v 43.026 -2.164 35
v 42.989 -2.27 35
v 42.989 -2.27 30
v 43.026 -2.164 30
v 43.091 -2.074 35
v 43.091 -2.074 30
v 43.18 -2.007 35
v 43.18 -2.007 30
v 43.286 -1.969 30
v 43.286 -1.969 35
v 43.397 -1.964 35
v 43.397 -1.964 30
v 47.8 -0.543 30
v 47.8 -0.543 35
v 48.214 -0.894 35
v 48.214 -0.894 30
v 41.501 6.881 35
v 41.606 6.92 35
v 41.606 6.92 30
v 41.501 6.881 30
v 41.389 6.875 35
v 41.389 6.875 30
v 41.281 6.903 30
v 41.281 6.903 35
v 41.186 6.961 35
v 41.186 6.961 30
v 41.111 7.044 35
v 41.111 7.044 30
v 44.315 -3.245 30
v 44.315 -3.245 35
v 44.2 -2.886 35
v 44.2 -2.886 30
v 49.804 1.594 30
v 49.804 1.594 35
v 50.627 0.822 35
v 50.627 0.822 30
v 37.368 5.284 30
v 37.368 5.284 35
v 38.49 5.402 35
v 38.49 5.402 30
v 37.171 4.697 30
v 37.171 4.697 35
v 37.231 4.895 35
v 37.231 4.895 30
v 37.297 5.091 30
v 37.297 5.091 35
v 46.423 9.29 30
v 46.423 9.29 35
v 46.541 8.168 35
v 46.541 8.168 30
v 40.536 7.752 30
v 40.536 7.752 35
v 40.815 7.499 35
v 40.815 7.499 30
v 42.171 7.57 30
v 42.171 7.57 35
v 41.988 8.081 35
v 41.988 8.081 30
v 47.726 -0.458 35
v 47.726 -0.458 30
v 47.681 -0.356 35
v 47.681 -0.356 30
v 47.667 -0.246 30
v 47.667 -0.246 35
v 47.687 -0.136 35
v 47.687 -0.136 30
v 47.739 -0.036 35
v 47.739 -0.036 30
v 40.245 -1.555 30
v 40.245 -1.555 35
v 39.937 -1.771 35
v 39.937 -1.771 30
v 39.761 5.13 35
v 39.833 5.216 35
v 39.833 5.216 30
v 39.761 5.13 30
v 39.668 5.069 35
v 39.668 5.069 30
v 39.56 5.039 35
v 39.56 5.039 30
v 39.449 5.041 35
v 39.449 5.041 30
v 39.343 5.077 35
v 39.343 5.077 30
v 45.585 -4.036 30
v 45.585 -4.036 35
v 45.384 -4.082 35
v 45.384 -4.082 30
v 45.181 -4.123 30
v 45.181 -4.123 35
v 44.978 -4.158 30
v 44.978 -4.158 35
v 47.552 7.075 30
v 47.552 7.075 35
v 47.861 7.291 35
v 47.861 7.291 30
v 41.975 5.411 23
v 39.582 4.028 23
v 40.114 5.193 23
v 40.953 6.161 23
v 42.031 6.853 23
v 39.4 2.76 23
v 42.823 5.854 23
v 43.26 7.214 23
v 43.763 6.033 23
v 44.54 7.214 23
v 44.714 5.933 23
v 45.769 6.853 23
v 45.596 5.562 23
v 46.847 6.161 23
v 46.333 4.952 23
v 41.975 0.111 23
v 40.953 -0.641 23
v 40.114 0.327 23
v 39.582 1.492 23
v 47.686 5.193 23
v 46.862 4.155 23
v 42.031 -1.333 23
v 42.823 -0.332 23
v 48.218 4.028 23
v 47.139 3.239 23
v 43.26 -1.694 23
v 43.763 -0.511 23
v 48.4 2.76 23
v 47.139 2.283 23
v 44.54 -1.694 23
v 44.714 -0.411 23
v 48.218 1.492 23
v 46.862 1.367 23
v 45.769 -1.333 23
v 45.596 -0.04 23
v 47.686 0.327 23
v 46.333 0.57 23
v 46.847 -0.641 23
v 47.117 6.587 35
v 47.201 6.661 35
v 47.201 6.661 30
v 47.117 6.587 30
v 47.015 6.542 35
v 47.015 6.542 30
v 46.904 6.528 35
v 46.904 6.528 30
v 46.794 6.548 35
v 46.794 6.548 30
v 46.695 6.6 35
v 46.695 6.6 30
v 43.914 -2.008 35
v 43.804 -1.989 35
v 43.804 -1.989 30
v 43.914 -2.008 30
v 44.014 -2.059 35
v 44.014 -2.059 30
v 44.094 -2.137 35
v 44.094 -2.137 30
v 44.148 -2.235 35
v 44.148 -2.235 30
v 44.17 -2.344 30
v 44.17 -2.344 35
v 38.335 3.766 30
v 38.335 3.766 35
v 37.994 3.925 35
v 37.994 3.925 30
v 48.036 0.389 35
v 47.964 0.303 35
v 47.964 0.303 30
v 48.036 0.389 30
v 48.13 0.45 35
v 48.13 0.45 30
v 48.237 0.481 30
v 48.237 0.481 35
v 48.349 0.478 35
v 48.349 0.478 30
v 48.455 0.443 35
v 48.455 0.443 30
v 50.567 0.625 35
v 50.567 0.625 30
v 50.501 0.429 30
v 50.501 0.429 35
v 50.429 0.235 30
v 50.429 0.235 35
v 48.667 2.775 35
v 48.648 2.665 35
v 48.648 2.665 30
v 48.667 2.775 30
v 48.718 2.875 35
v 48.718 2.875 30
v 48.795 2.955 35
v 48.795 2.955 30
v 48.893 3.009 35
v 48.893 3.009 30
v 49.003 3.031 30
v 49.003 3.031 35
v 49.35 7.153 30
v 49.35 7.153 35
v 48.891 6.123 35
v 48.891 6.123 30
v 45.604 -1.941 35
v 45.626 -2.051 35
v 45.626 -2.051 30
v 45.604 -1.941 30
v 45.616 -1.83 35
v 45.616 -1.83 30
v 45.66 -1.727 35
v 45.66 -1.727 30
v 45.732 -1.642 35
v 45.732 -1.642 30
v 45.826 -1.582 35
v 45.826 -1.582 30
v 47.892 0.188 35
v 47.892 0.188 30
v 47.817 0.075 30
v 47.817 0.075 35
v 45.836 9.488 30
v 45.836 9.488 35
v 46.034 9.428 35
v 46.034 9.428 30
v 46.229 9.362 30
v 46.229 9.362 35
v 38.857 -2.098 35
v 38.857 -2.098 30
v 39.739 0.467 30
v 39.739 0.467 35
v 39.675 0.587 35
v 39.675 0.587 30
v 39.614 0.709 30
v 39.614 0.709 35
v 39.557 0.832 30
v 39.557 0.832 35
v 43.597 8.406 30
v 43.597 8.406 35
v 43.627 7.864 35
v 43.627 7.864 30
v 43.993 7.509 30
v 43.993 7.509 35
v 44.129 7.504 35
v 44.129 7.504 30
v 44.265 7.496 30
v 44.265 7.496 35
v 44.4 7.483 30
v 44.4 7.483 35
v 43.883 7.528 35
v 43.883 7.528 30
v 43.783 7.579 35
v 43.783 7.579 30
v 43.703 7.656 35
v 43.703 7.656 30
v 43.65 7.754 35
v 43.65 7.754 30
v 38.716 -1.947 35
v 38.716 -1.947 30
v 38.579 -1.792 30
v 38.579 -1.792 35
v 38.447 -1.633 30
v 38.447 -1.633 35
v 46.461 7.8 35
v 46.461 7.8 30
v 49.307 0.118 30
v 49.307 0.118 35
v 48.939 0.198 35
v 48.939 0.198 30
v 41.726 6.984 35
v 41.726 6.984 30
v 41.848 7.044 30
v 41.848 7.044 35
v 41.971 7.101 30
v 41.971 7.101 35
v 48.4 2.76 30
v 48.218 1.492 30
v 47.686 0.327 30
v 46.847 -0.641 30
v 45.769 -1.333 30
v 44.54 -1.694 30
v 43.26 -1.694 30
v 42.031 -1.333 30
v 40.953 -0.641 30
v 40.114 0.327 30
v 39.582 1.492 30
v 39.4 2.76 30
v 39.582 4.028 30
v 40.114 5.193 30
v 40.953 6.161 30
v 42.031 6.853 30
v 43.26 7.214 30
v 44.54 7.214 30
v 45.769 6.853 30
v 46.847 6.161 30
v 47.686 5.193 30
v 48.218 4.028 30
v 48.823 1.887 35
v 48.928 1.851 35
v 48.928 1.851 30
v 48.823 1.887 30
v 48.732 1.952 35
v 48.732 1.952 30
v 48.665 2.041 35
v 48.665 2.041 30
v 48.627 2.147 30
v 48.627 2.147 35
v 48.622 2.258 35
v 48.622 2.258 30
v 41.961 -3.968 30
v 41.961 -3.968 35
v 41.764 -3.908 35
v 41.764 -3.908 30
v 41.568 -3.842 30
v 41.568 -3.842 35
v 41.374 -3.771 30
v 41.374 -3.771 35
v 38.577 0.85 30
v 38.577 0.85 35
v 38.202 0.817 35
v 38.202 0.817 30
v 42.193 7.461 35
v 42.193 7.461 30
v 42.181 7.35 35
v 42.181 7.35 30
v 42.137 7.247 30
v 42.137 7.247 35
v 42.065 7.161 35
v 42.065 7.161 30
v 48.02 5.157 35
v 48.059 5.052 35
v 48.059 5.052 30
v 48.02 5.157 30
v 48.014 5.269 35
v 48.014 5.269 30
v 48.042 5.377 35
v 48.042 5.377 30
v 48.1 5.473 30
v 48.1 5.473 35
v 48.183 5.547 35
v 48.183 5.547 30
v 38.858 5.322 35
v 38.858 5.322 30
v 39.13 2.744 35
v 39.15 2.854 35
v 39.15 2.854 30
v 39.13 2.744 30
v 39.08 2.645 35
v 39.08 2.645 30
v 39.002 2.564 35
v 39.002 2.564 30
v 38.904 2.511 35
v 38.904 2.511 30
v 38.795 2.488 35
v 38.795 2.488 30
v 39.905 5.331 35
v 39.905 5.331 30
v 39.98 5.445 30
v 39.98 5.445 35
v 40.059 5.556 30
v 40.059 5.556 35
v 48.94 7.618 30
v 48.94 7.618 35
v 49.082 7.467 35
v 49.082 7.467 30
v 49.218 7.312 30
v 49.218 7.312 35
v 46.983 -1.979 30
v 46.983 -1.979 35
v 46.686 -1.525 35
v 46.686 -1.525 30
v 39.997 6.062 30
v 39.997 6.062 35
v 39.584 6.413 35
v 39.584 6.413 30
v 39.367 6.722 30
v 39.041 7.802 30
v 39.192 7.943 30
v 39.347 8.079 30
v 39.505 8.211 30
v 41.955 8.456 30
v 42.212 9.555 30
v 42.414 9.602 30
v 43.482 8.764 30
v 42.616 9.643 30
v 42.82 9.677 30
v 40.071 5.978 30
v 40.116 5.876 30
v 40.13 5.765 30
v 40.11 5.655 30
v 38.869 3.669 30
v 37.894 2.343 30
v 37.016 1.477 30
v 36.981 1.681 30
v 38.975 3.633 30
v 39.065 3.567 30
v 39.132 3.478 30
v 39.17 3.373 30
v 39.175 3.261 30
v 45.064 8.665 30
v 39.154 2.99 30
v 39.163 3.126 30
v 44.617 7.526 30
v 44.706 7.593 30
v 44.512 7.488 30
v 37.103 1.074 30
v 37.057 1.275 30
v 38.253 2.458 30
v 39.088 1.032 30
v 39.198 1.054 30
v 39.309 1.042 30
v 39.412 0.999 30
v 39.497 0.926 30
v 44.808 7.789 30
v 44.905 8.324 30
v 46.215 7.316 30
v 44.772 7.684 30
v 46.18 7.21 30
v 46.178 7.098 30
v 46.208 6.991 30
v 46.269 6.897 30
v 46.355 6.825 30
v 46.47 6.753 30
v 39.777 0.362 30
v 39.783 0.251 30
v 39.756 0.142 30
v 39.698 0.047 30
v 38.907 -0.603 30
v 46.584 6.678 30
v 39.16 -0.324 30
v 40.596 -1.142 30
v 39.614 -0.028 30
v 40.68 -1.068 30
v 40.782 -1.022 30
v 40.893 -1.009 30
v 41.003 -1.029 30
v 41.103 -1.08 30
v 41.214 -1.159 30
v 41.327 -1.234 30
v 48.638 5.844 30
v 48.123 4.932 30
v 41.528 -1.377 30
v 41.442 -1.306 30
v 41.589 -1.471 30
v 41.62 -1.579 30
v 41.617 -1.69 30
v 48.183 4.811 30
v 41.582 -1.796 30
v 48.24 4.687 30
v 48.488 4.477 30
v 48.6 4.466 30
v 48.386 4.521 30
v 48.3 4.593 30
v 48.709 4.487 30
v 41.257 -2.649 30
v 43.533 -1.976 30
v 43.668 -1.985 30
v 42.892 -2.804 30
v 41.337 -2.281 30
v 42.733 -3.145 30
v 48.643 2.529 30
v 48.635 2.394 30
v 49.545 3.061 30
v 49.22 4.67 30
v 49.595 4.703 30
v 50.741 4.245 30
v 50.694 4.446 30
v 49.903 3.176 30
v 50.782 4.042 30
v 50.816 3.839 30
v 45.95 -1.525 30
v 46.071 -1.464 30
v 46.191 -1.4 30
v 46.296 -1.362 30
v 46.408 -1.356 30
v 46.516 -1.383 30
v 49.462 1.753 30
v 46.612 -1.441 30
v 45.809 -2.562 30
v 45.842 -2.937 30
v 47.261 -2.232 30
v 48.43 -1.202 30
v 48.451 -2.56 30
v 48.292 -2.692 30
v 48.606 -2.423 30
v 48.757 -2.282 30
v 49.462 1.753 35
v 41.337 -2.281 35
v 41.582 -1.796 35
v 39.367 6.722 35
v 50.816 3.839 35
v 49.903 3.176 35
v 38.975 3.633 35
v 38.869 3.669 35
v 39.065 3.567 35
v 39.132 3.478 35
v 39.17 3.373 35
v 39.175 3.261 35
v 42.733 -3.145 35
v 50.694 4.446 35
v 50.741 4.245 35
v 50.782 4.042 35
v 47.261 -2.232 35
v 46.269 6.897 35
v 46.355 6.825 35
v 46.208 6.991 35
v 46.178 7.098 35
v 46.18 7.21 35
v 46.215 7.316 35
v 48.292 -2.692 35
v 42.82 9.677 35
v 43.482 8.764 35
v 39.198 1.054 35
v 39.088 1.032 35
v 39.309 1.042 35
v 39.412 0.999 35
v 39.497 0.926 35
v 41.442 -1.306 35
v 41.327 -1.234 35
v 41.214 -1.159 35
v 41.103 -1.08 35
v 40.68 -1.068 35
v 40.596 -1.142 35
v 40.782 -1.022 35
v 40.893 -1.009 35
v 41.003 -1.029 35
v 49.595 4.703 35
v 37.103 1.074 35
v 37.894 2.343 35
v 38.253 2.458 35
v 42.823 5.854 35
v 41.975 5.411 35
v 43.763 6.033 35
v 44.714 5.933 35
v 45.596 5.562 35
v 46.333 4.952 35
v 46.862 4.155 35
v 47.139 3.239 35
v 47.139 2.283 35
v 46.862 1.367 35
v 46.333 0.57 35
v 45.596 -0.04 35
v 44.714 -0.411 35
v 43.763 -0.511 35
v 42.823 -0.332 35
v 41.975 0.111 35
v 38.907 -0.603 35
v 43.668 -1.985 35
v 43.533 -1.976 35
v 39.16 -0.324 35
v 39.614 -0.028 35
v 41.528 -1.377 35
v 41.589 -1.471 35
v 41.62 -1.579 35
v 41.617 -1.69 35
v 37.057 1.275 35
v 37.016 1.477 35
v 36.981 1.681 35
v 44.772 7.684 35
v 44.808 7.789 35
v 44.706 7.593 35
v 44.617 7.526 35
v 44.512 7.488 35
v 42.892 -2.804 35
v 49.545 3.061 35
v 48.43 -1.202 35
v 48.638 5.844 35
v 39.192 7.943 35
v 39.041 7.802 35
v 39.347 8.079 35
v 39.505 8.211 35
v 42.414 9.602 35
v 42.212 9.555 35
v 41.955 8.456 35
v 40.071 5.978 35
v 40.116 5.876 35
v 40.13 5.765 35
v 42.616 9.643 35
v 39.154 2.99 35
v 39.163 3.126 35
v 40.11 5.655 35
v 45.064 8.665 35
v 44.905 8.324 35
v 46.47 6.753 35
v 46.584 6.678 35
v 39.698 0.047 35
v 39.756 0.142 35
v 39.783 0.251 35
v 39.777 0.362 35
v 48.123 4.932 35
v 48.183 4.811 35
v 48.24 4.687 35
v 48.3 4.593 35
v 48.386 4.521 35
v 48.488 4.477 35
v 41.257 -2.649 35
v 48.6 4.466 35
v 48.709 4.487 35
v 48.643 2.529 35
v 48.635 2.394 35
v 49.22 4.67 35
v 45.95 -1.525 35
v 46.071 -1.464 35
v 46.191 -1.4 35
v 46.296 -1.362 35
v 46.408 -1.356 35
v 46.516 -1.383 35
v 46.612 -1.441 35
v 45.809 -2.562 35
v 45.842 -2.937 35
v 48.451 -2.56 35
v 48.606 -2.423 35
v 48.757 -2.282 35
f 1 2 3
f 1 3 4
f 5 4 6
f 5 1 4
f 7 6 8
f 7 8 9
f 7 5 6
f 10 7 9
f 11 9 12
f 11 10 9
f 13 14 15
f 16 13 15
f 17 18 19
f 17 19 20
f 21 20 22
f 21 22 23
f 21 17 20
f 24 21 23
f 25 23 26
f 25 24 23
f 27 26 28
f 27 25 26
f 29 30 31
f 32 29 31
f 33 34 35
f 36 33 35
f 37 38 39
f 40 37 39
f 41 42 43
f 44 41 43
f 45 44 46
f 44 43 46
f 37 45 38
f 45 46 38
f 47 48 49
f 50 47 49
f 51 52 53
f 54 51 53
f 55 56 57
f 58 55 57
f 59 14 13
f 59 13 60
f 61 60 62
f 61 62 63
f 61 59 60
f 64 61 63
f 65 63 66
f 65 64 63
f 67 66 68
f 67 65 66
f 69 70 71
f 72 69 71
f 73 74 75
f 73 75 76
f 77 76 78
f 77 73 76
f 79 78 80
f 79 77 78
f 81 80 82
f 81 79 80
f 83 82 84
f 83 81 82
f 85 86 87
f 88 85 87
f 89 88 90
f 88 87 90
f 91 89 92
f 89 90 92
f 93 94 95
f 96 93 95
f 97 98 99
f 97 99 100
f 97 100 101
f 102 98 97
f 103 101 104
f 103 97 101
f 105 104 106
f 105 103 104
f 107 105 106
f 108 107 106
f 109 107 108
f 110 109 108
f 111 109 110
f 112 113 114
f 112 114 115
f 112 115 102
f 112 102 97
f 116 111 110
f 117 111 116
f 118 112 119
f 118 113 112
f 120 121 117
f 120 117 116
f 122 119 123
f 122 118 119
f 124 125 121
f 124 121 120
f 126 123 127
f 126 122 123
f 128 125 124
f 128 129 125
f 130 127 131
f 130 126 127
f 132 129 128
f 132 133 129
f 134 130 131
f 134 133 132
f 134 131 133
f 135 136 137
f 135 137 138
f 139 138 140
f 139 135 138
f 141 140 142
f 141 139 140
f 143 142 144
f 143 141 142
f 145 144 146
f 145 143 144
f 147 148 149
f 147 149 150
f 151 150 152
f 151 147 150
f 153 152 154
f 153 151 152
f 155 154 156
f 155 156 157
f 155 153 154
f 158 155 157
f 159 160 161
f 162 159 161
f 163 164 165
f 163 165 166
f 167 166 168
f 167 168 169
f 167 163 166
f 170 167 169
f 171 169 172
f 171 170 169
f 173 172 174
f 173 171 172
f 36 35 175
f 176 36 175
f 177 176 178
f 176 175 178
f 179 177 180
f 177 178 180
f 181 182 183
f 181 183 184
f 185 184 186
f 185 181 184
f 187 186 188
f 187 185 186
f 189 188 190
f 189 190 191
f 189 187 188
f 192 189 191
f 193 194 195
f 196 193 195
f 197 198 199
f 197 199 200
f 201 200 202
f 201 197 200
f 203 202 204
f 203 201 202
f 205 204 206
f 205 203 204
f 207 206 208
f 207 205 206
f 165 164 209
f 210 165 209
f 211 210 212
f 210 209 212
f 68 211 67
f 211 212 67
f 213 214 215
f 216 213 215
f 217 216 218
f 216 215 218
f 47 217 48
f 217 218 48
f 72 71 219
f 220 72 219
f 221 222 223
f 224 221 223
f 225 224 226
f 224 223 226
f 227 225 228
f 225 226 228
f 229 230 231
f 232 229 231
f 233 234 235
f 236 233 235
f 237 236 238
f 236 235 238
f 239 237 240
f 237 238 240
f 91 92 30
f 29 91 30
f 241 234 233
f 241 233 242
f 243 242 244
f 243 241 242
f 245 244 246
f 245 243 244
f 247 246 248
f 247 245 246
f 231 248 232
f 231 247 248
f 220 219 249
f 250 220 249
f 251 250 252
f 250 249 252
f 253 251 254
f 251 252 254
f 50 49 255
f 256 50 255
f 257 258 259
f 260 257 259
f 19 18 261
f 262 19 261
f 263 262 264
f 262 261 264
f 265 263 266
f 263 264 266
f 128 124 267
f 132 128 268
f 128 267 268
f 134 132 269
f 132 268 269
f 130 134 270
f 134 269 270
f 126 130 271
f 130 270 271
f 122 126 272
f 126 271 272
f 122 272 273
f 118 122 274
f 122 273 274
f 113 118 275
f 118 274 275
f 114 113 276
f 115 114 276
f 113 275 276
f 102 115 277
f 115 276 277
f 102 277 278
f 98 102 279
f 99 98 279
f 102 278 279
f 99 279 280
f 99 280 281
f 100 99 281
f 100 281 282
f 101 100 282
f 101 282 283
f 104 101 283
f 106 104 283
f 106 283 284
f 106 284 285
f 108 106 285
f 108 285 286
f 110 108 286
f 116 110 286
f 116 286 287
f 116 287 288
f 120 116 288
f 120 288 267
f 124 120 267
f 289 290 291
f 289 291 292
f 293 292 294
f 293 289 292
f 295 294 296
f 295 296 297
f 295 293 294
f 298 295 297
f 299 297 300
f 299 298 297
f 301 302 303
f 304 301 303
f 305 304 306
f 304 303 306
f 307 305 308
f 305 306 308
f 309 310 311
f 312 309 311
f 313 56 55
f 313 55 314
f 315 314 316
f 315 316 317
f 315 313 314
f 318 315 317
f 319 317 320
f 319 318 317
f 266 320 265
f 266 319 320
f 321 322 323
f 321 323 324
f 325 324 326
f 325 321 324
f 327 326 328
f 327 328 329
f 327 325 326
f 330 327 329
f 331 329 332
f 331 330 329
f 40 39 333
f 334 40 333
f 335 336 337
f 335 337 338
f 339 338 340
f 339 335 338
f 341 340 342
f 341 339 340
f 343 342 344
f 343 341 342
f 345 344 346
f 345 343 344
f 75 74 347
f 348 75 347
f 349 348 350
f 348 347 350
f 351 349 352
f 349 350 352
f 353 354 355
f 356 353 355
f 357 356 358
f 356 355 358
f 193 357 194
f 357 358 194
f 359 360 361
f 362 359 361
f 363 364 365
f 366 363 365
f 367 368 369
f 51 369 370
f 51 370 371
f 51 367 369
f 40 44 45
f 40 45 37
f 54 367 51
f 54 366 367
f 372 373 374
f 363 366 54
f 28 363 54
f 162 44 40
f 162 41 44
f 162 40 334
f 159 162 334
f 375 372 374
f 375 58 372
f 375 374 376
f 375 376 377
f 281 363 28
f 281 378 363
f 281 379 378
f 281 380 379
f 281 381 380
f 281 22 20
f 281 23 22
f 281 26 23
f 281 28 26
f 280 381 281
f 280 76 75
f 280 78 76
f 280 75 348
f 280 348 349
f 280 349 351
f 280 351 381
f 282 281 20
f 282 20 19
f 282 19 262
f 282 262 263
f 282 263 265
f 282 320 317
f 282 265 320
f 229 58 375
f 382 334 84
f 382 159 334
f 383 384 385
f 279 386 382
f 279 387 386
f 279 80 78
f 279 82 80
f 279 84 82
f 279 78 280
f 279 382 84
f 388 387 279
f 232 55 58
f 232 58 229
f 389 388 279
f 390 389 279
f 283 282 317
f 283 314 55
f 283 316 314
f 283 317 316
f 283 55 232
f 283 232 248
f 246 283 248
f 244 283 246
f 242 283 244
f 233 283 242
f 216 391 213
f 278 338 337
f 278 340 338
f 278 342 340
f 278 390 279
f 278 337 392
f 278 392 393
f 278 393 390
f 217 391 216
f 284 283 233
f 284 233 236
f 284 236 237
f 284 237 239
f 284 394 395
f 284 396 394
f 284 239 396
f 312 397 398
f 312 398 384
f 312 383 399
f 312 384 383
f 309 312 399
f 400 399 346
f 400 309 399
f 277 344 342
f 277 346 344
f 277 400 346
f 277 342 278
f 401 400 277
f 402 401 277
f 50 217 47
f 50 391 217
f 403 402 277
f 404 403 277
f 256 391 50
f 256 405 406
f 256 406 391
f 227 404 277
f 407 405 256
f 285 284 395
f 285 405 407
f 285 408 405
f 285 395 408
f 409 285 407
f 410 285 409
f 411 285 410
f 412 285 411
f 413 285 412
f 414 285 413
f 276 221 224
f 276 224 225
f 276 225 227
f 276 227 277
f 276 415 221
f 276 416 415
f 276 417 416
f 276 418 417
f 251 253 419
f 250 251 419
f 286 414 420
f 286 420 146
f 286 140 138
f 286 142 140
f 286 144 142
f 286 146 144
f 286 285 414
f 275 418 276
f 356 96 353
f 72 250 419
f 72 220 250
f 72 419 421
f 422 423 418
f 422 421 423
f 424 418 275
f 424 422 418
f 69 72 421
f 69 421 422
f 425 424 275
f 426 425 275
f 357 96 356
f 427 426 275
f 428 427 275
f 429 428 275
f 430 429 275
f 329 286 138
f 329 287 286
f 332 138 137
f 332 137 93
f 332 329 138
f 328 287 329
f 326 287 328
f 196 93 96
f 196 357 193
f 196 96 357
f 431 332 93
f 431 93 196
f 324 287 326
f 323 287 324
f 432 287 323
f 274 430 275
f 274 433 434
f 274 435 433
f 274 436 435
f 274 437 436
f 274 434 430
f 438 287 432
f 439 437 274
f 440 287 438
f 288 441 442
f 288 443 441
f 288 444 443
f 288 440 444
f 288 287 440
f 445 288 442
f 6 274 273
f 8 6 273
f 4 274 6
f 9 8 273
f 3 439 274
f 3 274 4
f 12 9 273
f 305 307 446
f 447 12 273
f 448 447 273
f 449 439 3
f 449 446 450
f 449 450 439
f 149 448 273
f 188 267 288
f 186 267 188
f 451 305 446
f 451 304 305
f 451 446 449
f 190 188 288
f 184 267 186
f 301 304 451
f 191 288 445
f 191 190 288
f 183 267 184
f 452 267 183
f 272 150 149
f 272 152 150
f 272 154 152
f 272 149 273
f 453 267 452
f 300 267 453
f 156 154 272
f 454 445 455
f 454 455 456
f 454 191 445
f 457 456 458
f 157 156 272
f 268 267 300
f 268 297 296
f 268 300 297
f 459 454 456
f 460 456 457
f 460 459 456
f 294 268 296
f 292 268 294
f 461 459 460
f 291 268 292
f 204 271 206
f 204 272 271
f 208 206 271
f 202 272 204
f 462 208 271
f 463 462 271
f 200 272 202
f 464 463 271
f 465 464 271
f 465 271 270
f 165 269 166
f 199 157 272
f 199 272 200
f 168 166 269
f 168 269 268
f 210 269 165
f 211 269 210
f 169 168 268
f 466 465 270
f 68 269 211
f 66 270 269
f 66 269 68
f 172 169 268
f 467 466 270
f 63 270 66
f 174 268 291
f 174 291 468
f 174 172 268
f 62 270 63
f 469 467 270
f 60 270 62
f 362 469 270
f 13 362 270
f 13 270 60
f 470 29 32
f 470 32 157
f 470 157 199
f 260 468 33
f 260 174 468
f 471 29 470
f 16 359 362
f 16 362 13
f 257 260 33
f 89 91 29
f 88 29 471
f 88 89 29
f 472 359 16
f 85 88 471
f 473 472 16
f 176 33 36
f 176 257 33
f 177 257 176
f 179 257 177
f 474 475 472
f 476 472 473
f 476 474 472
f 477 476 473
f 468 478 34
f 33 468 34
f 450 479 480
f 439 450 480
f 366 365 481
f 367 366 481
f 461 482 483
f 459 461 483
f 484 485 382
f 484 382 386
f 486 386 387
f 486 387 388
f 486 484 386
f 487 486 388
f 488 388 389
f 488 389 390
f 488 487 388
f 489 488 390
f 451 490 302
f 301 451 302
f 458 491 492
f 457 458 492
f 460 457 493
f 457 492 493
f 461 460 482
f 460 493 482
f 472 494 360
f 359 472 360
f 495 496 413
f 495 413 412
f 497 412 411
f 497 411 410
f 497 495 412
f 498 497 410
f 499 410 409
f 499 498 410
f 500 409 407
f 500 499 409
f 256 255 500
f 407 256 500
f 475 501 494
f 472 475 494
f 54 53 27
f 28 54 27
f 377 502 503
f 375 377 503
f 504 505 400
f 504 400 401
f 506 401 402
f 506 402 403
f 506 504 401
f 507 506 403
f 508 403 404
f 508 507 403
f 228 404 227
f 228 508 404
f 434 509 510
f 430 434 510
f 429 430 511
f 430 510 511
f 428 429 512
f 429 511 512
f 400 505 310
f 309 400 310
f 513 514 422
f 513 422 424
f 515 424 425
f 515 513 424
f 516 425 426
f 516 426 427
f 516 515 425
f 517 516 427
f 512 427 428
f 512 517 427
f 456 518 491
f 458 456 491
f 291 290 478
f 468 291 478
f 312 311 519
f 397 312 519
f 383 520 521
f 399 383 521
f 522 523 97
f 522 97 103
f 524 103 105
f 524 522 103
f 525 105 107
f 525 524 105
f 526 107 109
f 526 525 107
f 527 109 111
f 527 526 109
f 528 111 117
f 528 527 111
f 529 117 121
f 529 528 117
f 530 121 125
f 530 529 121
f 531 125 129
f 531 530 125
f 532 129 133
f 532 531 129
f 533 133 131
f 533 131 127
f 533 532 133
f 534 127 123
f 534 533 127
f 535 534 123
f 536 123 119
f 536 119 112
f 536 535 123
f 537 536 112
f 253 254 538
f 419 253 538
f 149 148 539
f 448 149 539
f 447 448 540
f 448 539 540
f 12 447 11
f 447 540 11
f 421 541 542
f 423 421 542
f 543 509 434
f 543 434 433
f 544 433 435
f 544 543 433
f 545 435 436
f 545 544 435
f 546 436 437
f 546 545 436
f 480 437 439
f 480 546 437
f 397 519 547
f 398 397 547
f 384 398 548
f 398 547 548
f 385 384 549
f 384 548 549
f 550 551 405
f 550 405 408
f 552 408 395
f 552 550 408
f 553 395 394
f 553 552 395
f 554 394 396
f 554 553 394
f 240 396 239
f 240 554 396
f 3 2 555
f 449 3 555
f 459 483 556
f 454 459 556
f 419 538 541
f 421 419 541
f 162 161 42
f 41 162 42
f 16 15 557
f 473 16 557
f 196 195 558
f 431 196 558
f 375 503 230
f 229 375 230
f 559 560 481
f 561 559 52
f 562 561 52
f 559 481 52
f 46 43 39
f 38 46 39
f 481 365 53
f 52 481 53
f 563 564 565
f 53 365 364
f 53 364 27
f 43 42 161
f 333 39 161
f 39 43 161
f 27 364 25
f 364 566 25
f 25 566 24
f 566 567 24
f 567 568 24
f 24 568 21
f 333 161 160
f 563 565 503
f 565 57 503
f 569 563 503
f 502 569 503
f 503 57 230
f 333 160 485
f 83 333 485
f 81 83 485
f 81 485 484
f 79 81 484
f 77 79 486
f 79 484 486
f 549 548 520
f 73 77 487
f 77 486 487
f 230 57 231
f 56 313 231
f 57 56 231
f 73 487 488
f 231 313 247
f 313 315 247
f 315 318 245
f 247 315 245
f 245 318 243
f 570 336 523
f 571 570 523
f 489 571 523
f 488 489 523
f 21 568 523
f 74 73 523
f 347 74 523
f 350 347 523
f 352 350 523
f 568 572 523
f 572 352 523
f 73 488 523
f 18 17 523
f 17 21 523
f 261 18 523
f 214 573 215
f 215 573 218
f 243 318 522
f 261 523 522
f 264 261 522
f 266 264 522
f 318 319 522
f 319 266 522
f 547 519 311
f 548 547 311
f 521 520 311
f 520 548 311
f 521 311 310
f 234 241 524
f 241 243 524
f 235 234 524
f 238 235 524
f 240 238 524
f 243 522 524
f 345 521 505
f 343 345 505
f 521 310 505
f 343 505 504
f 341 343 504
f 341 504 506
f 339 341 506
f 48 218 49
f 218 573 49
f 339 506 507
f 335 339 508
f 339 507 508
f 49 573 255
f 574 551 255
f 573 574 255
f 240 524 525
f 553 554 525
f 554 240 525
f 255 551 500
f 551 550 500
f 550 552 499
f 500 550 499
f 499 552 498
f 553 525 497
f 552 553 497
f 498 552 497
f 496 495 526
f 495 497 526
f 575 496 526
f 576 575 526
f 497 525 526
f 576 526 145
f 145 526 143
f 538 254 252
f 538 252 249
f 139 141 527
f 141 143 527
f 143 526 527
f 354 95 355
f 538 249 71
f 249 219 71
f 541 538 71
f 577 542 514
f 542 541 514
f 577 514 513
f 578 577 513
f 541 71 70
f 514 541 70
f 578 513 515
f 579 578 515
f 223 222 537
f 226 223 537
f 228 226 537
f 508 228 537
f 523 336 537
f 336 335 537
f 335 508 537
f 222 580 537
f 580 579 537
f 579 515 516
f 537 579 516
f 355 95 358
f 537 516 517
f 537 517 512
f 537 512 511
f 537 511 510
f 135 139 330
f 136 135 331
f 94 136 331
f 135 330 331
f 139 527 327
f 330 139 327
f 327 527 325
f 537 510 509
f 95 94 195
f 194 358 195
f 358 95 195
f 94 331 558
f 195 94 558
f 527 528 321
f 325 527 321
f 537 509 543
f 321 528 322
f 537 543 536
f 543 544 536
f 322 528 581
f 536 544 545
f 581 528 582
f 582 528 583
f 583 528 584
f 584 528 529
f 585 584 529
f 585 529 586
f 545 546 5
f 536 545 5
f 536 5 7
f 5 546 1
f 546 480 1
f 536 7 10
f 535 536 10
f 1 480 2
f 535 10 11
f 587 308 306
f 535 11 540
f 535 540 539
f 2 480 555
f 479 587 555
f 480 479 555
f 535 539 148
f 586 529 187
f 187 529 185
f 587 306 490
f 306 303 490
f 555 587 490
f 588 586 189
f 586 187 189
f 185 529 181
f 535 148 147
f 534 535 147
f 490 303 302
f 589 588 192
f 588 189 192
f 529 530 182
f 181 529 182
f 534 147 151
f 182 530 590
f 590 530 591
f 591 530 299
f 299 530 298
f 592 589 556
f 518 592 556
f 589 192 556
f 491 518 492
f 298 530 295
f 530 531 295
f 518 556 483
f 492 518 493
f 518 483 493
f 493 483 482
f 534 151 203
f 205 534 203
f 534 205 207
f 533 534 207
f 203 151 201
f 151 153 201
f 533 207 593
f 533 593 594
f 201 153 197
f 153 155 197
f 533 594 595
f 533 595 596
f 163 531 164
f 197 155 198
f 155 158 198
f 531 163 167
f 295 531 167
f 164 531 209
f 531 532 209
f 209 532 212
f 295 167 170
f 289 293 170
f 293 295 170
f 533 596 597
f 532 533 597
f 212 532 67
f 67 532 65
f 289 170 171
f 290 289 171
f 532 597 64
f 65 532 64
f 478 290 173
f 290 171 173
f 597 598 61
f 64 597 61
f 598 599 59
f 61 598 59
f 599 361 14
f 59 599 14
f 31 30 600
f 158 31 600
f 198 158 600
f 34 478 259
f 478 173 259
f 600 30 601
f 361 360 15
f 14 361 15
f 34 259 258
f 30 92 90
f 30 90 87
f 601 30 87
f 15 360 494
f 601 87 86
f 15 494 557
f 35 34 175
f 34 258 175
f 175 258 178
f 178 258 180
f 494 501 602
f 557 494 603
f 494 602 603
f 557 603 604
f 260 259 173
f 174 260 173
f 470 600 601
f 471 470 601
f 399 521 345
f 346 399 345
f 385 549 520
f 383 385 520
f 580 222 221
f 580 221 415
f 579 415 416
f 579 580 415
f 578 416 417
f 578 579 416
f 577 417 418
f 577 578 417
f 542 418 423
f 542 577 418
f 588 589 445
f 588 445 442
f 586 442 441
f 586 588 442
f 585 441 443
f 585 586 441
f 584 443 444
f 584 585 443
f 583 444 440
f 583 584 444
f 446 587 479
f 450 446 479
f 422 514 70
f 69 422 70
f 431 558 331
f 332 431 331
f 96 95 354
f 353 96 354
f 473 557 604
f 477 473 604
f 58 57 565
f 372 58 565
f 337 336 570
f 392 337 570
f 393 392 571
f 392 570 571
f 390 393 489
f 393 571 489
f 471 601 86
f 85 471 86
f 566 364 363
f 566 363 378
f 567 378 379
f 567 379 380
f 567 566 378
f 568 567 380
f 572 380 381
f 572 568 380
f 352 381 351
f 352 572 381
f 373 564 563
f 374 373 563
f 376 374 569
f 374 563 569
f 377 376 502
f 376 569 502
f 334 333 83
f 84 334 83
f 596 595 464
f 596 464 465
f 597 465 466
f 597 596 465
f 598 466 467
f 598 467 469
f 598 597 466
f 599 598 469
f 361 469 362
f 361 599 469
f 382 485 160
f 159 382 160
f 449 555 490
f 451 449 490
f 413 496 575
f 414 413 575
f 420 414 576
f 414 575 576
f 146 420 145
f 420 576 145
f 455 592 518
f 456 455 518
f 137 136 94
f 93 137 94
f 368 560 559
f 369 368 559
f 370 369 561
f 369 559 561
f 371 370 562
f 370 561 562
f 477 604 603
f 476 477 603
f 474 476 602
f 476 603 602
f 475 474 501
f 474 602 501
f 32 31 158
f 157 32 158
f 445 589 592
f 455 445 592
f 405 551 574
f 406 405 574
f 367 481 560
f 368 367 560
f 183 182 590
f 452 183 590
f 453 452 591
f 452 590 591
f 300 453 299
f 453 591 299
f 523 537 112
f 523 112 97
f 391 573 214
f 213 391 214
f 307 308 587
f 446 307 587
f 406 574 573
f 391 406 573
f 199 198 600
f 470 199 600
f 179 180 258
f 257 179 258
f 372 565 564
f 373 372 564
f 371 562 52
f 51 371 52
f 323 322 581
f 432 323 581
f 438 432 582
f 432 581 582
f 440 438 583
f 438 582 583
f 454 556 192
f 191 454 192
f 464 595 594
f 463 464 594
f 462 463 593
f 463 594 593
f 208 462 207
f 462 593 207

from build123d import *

# Parameters (mm, degrees)
PAD018_DEPTH           = 12
CYLINDER023_R          = 4.5
CYLINDER023_DEPTH      = 12
PAD019_DEPTH           = 5
CUT017_PLACEMENT_ANGLE = 180


with BuildPart() as body016:
    # Sketch153 → Pad018 (new body)
    with BuildSketch(Plane.XY):
        with BuildLine():
            ThreePointArc((-1.924981, -2.651228), (3.274094, -0.001028), (-1.924981, 2.649172))
            Line((-1.924981, 2.649172), (-1.924981, -2.651228))
        make_face()
    extrude(amount=PAD018_DEPTH)


with BuildPart() as cylinder023:
    # Cylinder023 → Cylinder023 (new body)
    with BuildSketch(Plane.XY):
        Circle(CYLINDER023_R)
    extrude(amount=CYLINDER023_DEPTH)


with BuildPart() as pinion001:
    # Sketch154 → Pad019 (new body)
    with BuildSketch(Plane.XY):
        with BuildLine():
            Line((5.562447, 1.006802), (5.903793, 1.165811))
            Line((5.903793, 1.165811), (6.726635, 1.937659))
            ThreePointArc((6.726635, 1.937659), (6.634334, 2.233423), (6.529036, 2.524814))
            Line((6.529036, 2.524814), (5.406959, 2.642124))
            Line((5.406959, 2.642124), (5.03893, 2.562402))
            Line((5.03893, 2.562402), (4.554688, 2.317075))
            ThreePointArc((4.06426, 2.456563), (4.282119, 2.290644), (4.554688, 2.317075))
            ThreePointArc((4.06426, 2.456563), (3.955033, 2.628881), (3.838507, 2.796349))
            ThreePointArc((3.899966, 3.30251), (3.769976, 3.061482), (3.838507, 2.796349))
            Line((3.899966, 3.30251), (4.313775, 3.653848))
            Line((4.313775, 3.653848), (4.529885, 3.962227))
            Line((4.529885, 3.962227), (4.856563, 5.042087))
            ThreePointArc((4.856563, 5.042087), (4.628746, 5.252076), (4.39186, 5.451779))
            Line((4.39186, 5.451779), (3.361458, 4.992334))
            Line((3.361458, 4.992334), (3.082596, 4.739278))
            Line((3.082596, 4.739278), (2.785893, 4.284698))
            ThreePointArc((2.291426, 4.160284), (2.563058, 4.125524), (2.785893, 4.284698))
            ThreePointArc((2.291426, 4.160284), (2.110674, 4.254902), (1.926025, 4.34167))
            ThreePointArc((1.72617, 4.810749), (1.734109, 4.537017), (1.926025, 4.34167))
            Line((1.72617, 4.810749), (1.90887, 5.321921))
            Line((1.90887, 5.321921), (1.941838, 5.697039))
            Line((1.941838, 5.697039), (1.684819, 6.795565))
            ThreePointArc((1.684819, 6.795565), (1.382529, 6.863512), (1.077528, 6.918017))
            Line((1.077528, 6.918017), (0.414896, 6.004925))
            Line((0.414896, 6.004925), (0.299923, 5.646341))
            Line((0.299923, 5.646341), (0.270261, 5.104312))
            ThreePointArc((-0.095753, 4.749333), (0.156867, 4.855045), (0.270261, 5.104312))
            ThreePointArc((-0.095753, 4.749333), (-0.299598, 4.740898), (-0.502893, 4.723717))
            ThreePointArc((-0.910512, 5.030024), (-0.76677, 4.796935), (-0.502893, 4.723717))
            Line((-0.910512, 5.030024), (-1.007875, 5.564062))
            Line((-1.007875, 5.564062), (-1.166883, 5.905408))
            Line((-1.166883, 5.905408), (-1.938731, 6.72825))
            ThreePointArc((-1.938731, 6.72825), (-2.234496, 6.635949), (-2.525886, 6.53065))
            Line((-2.525886, 6.53065), (-2.643196, 5.408573))
            Line((-2.643196, 5.408573), (-2.563474, 5.040545))
            Line((-2.563474, 5.040545), (-2.318147, 4.556302))
            ThreePointArc((-2.457636, 4.065874), (-2.291717, 4.283734), (-2.318147, 4.556302))
            ThreePointArc((-2.457636, 4.065874), (-2.629953, 3.956647), (-2.797421, 3.840121))
            ThreePointArc((-3.303583, 3.90158), (-3.062555, 3.77159), (-2.797421, 3.840121))
            Line((-3.303583, 3.90158), (-3.65492, 4.315389))
            Line((-3.65492, 4.315389), (-3.963299, 4.531499))
            Line((-3.963299, 4.531499), (-5.04316, 4.858177))
            ThreePointArc((-5.04316, 4.858177), (-5.253149, 4.63036), (-5.452851, 4.393474))
            Line((-5.452851, 4.393474), (-4.993407, 3.363072))
            Line((-4.993407, 3.363072), (-4.740351, 3.084211))
            Line((-4.740351, 3.084211), (-4.28577, 2.787507))
            ThreePointArc((-4.161356, 2.29304), (-4.126596, 2.564672), (-4.28577, 2.787507))
            ThreePointArc((-4.161356, 2.29304), (-4.255974, 2.112288), (-4.342743, 1.927639))
            ThreePointArc((-4.811821, 1.727784), (-4.53809, 1.735724), (-4.342743, 1.927639))
            Line((-4.811821, 1.727784), (-5.322993, 1.910485))
            Line((-5.322993, 1.910485), (-5.698112, 1.943452))
            Line((-5.698112, 1.943452), (-6.796638, 1.686433))
            ThreePointArc((-6.796638, 1.686433), (-6.864585, 1.384143), (-6.919089, 1.079142))
            Line((-6.919089, 1.079142), (-6.005997, 0.41651))
            Line((-6.005997, 0.41651), (-5.647414, 0.301537))
            Line((-5.647414, 0.301537), (-5.105384, 0.271875))
            ThreePointArc((-4.750405, -0.094139), (-4.856118, 0.158481), (-5.105384, 0.271875))
            ThreePointArc((-4.750405, -0.094139), (-4.74197, -0.297984), (-4.72479, -0.501279))
            ThreePointArc((-5.031096, -0.908898), (-4.798007, -0.765156), (-4.72479, -0.501279))
            Line((-5.031096, -0.908898), (-5.565134, -1.00626))
            Line((-5.565134, -1.00626), (-5.90648, -1.165269))
            Line((-5.90648, -1.165269), (-6.729322, -1.937117))
            ThreePointArc((-6.729322, -1.937117), (-6.637021, -2.232881), (-6.531723, -2.524272))
            Line((-6.531723, -2.524272), (-5.409646, -2.641582))
            Line((-5.409646, -2.641582), (-5.041617, -2.56186))
            Line((-5.041617, -2.56186), (-4.557374, -2.316533))
            ThreePointArc((-4.066946, -2.456021), (-4.284806, -2.290102), (-4.557374, -2.316533))
            ThreePointArc((-4.066946, -2.456021), (-3.957719, -2.628339), (-3.841193, -2.795807))
            ThreePointArc((-3.902653, -3.301969), (-3.772663, -3.06094), (-3.841193, -2.795807))
            Line((-3.902653, -3.301969), (-4.316462, -3.653306))
            Line((-4.316462, -3.653306), (-4.532572, -3.961685))
            Line((-4.532572, -3.961685), (-4.85925, -5.041545))
            ThreePointArc((-4.85925, -5.041545), (-4.631433, -5.251535), (-4.394546, -5.451237))
            Line((-4.394546, -5.451237), (-3.364144, -4.991792))
            Line((-3.364144, -4.991792), (-3.085283, -4.738736))
            Line((-3.085283, -4.738736), (-2.78858, -4.284156))
            ThreePointArc((-2.294113, -4.159742), (-2.565744, -4.124982), (-2.78858, -4.284156))
            ThreePointArc((-2.294113, -4.159742), (-2.11336, -4.25436), (-1.928712, -4.341129))
            ThreePointArc((-1.728857, -4.810207), (-1.736796, -4.536475), (-1.928712, -4.341129))
            Line((-1.728857, -4.810207), (-1.911557, -5.321379))
            Line((-1.911557, -5.321379), (-1.944525, -5.696498))
            Line((-1.944525, -5.696498), (-1.687506, -6.795023))
            ThreePointArc((-1.687506, -6.795023), (-1.385216, -6.862971), (-1.080215, -6.917475))
            Line((-1.080215, -6.917475), (-0.417583, -6.004383))
            Line((-0.417583, -6.004383), (-0.30261, -5.6458))
            Line((-0.30261, -5.6458), (-0.272948, -5.10377))
            ThreePointArc((0.093067, -4.748791), (-0.159553, -4.854503), (-0.272948, -5.10377))
            ThreePointArc((0.093067, -4.748791), (0.296912, -4.740356), (0.500206, -4.723176))
            ThreePointArc((0.907825, -5.029482), (0.764084, -4.796393), (0.500206, -4.723176))
            Line((0.907825, -5.029482), (1.005188, -5.56352))
            Line((1.005188, -5.56352), (1.164197, -5.904866))
            Line((1.164197, -5.904866), (1.936044, -6.727708))
            ThreePointArc((1.936044, -6.727708), (2.231809, -6.635407), (2.523199, -6.530108))
            Line((2.523199, -6.530108), (2.64051, -5.408032))
            Line((2.64051, -5.408032), (2.560787, -5.040003))
            Line((2.560787, -5.040003), (2.315461, -4.55576))
            ThreePointArc((2.454949, -4.065332), (2.28903, -4.283192), (2.315461, -4.55576))
            ThreePointArc((2.454949, -4.065332), (2.627267, -3.956105), (2.794735, -3.839579))
            ThreePointArc((3.300896, -3.901038), (3.059868, -3.771048), (2.794735, -3.839579))
            Line((3.300896, -3.901038), (3.652234, -4.314848))
            Line((3.652234, -4.314848), (3.960612, -4.530958))
            Line((3.960612, -4.530958), (5.040473, -4.857636))
            ThreePointArc((5.040473, -4.857636), (5.250462, -4.629818), (5.450164, -4.392932))
            Line((5.450164, -4.392932), (4.99072, -3.36253))
            Line((4.99072, -3.36253), (4.737664, -3.083669))
            Line((4.737664, -3.083669), (4.283083, -2.786966))
            ThreePointArc((4.15867, -2.292498), (4.123909, -2.56413), (4.283083, -2.786966))
            ThreePointArc((4.15867, -2.292498), (4.253288, -2.111746), (4.340056, -1.927098))
            ThreePointArc((4.809135, -1.727242), (4.535403, -1.735182), (4.340056, -1.927098))
            Line((4.809135, -1.727242), (5.320306, -1.909943))
            Line((5.320306, -1.909943), (5.695425, -1.94291))
            Line((5.695425, -1.94291), (6.793951, -1.685891))
            ThreePointArc((6.793951, -1.685891), (6.861898, -1.383601), (6.916402, -1.078601))
            Line((6.916402, -1.078601), (6.003311, -0.415969))
            Line((6.003311, -0.415969), (5.644727, -0.300996))
            Line((5.644727, -0.300996), (5.102697, -0.271334))
            ThreePointArc((4.747718, 0.094681), (4.853431, -0.157939), (5.102697, -0.271334))
            ThreePointArc((4.747718, 0.094681), (4.739284, 0.298526), (4.722103, 0.501821))
            ThreePointArc((5.028409, 0.909439), (4.795321, 0.765698), (4.722103, 0.501821))
            Line((5.028409, 0.909439), (5.562447, 1.006802))
        make_face()
    extrude(amount=PAD019_DEPTH)

    # Fusion024: union Cylinder023
    add(cylinder023.part)

    # Cut017: cut Body016
    add(body016.part, mode=Mode.SUBTRACT)


with BuildPart() as pinion001_1:
    # Cut017 placement: moved
    add(pinion001.part.moved(Location((43.9, 2.76, 35))).rotate(Axis((43.9, 2.76, 35), (1, 0, 0)), CUT017_PLACEMENT_ANGLE))


solid = pinion001_1.part
